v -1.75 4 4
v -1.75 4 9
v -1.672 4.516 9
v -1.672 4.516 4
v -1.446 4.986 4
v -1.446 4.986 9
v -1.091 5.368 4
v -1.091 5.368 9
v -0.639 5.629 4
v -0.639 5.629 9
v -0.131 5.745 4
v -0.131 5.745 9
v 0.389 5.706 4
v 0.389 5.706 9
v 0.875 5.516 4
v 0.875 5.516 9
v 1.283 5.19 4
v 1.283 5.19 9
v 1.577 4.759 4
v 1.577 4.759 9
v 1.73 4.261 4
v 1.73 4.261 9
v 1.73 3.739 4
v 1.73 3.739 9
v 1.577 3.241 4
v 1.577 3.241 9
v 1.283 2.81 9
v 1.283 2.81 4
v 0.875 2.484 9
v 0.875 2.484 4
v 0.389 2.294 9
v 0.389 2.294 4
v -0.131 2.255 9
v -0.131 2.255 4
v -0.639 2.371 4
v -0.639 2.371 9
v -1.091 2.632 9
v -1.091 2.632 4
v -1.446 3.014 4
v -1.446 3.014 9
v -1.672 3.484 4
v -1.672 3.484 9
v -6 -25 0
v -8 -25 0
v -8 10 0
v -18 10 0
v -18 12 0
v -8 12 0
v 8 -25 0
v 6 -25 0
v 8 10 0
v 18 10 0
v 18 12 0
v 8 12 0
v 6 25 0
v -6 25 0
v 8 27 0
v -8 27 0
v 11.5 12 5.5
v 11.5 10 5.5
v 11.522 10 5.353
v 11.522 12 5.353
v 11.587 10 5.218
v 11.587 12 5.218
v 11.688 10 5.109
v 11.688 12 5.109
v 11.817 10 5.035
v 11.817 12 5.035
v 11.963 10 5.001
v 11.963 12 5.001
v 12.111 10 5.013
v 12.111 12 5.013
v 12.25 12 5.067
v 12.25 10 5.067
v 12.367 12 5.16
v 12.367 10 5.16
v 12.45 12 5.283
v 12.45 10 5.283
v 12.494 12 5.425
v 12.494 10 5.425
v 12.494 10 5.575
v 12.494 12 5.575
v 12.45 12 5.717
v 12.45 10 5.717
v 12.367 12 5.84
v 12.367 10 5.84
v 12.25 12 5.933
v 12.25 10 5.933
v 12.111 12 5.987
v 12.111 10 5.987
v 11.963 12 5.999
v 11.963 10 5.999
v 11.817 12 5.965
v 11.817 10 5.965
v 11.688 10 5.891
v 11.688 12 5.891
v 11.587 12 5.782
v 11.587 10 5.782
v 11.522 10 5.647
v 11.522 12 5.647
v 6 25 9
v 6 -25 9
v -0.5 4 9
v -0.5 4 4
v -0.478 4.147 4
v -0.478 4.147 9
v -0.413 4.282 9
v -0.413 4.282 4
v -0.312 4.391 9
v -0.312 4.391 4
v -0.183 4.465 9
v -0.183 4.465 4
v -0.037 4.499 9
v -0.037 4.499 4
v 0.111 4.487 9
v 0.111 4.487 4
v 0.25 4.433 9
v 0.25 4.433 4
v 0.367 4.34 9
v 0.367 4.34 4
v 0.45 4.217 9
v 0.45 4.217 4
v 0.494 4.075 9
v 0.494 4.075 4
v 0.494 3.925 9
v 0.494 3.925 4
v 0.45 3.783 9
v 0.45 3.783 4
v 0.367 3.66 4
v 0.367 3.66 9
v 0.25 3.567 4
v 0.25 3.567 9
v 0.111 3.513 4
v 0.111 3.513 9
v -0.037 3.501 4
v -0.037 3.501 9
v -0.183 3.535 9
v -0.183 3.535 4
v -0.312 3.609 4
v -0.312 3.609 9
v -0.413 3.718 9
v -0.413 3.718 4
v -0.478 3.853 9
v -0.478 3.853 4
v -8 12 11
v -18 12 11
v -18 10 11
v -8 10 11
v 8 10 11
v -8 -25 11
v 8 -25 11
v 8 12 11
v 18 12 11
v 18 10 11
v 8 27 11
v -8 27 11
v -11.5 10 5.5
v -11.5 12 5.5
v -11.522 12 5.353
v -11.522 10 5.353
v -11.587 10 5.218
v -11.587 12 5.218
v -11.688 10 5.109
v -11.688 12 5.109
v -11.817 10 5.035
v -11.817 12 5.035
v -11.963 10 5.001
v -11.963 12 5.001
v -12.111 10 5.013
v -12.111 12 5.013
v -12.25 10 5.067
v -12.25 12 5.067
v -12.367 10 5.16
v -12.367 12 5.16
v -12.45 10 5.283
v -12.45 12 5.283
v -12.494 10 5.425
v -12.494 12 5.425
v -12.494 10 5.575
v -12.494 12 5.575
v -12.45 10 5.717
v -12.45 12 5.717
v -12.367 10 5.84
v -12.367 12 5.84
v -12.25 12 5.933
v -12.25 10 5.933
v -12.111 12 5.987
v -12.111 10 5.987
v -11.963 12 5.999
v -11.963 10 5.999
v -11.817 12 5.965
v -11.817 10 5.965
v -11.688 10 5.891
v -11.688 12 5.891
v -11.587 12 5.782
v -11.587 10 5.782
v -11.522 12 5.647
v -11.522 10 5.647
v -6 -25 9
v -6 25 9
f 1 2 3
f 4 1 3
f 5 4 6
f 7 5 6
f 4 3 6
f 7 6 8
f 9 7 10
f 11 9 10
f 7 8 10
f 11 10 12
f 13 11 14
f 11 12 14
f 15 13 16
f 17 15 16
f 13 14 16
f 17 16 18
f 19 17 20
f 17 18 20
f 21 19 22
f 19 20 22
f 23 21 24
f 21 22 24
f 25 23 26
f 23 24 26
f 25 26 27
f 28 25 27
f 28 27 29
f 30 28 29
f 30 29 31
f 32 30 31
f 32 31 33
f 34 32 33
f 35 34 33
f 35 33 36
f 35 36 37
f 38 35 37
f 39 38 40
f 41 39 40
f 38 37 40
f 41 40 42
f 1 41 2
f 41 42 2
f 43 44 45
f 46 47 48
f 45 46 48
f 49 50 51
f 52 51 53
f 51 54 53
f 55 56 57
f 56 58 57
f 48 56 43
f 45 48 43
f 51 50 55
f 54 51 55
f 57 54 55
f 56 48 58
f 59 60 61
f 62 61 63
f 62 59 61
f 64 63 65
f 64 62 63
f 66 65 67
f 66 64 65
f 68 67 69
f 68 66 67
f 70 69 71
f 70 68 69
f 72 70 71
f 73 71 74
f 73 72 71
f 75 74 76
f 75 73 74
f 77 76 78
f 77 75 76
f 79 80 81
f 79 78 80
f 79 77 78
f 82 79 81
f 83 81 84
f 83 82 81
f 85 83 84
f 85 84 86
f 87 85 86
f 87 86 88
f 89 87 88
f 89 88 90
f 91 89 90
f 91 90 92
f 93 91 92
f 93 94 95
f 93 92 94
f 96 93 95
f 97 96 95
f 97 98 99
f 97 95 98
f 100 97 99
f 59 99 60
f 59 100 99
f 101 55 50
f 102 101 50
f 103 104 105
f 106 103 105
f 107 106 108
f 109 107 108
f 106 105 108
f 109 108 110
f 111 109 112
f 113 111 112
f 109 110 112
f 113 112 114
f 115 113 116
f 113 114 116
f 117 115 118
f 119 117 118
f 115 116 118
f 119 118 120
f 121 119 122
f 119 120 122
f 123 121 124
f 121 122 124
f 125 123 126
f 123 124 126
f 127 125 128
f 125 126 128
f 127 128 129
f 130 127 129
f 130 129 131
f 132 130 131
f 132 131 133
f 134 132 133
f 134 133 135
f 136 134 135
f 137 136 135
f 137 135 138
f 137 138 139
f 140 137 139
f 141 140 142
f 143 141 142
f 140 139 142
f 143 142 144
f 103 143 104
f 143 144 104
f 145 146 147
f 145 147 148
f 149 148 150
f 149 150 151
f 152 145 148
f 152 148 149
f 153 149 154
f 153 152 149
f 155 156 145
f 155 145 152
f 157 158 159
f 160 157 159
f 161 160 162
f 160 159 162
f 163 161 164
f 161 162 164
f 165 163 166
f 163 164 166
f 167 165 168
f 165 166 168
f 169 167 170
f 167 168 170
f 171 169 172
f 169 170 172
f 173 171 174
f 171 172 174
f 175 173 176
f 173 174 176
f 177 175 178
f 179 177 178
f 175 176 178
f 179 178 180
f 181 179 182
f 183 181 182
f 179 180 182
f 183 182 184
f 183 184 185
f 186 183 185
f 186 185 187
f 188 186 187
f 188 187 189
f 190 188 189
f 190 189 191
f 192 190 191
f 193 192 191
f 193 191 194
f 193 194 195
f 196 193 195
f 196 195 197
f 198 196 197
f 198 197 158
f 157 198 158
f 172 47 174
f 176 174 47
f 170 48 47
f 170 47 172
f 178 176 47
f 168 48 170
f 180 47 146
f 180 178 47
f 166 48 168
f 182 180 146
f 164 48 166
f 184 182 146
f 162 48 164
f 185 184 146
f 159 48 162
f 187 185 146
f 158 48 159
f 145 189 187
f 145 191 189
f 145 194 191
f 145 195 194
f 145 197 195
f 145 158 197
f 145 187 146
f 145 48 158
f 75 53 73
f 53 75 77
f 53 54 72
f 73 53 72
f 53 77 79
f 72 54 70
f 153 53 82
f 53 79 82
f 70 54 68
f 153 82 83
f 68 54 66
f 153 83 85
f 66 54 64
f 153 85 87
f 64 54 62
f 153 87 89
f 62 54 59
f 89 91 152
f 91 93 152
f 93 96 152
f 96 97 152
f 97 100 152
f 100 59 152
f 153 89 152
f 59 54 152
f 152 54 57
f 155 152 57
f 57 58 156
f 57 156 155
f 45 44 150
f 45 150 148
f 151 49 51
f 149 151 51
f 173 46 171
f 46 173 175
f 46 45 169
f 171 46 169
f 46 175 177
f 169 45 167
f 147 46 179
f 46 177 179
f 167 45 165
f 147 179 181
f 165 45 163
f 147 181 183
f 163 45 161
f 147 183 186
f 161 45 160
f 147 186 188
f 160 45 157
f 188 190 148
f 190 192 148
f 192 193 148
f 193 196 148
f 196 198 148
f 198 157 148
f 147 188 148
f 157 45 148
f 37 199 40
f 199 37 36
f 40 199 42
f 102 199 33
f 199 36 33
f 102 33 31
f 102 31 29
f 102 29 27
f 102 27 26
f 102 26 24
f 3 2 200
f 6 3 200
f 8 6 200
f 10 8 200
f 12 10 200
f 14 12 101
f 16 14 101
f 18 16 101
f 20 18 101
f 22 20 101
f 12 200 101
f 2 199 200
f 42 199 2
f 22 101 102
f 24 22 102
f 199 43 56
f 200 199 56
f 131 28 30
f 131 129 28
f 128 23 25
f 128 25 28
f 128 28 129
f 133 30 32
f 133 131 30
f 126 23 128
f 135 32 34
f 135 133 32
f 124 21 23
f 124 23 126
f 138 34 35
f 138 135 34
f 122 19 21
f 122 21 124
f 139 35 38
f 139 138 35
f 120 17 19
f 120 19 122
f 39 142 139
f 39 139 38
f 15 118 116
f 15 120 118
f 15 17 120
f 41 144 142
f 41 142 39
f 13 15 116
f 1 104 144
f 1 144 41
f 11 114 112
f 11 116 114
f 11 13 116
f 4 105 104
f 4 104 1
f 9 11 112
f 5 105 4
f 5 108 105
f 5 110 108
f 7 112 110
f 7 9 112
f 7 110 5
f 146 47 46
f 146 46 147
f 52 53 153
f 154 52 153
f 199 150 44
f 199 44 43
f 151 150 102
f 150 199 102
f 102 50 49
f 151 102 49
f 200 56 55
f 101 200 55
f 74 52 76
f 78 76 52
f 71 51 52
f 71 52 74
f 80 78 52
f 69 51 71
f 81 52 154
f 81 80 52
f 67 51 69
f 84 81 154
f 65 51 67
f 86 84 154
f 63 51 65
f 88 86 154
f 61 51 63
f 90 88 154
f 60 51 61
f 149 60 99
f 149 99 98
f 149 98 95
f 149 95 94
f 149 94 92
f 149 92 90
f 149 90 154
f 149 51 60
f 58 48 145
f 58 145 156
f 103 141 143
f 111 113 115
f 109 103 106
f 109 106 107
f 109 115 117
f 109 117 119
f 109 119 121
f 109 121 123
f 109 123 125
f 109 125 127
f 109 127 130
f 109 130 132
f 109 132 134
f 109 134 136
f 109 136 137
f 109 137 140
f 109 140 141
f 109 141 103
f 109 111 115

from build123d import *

# Parameters (mm, degrees)
BOSS_EXTRU_1_DEPTH      = 9
ESQUISSE2_W             = 16
ESQUISSE2_H             = 52
BOSS_EXTRU_2_DEPTH      = 2
ESQUISSE5_R             = 1.75
BOSS_EXTRU_5_DEPTH      = 5
ESQUISSE6_R             = 0.5
ENL_V_MAT_EXTRU_1_DEPTH = 5
ESQUISSE11_W            = 11
ESQUISSE11_H            = 2
BOSS_EXTRU_6_DEPTH      = 10
ESQUISSE12_R            = 0.5
ENL_V_MAT_EXTRU_2_DEPTH = 38


with BuildPart() as part:
    # Esquisse1 → Boss.-Extru.1 (new body)
    with BuildSketch(Plane.XY):
        Polygon((-6, -25), (-6, 25), (6, 25), (6, -25), (8, -25), (8, 27), (-8, 27), (-8, -25), align=None)
    extrude(amount=BOSS_EXTRU_1_DEPTH)

    # Esquisse2 → Boss.-Extru.2 (add)
    with BuildSketch(Plane.XY.offset(9)):
        with Locations((0, 1)):
            Rectangle(ESQUISSE2_W, ESQUISSE2_H)
    extrude(amount=BOSS_EXTRU_2_DEPTH)

    # Esquisse5 → Boss.-Extru.5 (add)
    with BuildSketch(Plane(origin=(0, 0, 9), x_dir=(-1, 0, 0), z_dir=(0, 0, -1))):
        with Locations((0, 4)):
            Circle(ESQUISSE5_R)
    extrude(amount=BOSS_EXTRU_5_DEPTH)

    # Esquisse6 → Enlèv. mat.-Extru.1 (cut)
    with BuildSketch(Plane(origin=(0, 0, 4), x_dir=(-1, 0, 0), z_dir=(0, 0, -1))):
        with Locations((0, 4)):
            Circle(ESQUISSE6_R)
    extrude(amount=-ENL_V_MAT_EXTRU_1_DEPTH, mode=Mode.SUBTRACT)

    # Esquisse11 → Boss.-Extru.6 (add)
    with BuildSketch(Plane.ZY.offset(8)):
        with Locations((5.5, 11)):
            Rectangle(ESQUISSE11_W, ESQUISSE11_H)
    boss_extru_6 = extrude(amount=BOSS_EXTRU_6_DEPTH)

    # Esquisse12 → Enlèv. mat.-Extru.2 (cut, through all)
    with BuildSketch(Plane(origin=(0, 12, 0), x_dir=(1, 0, 0), z_dir=(0, 1, 0))):
        with Locations((-12, -5.5)):
            Circle(ESQUISSE12_R)
    enl_v_mat_extru_2 = extrude(amount=-ENL_V_MAT_EXTRU_2_DEPTH, mode=Mode.SUBTRACT)

    # Symétrie1: Boss.-Extru.6, Enlèv. mat.-Extru.2 across plane
    add(boss_extru_6.mirror(Plane(origin=(0, 0, 0), x_dir=(0, 0, 1), z_dir=(1, 0, 0))))
    add(enl_v_mat_extru_2.mirror(Plane(origin=(0, 0, 0), x_dir=(0, 0, 1), z_dir=(1, 0, 0))), mode=Mode.SUBTRACT)


solid = part.part
